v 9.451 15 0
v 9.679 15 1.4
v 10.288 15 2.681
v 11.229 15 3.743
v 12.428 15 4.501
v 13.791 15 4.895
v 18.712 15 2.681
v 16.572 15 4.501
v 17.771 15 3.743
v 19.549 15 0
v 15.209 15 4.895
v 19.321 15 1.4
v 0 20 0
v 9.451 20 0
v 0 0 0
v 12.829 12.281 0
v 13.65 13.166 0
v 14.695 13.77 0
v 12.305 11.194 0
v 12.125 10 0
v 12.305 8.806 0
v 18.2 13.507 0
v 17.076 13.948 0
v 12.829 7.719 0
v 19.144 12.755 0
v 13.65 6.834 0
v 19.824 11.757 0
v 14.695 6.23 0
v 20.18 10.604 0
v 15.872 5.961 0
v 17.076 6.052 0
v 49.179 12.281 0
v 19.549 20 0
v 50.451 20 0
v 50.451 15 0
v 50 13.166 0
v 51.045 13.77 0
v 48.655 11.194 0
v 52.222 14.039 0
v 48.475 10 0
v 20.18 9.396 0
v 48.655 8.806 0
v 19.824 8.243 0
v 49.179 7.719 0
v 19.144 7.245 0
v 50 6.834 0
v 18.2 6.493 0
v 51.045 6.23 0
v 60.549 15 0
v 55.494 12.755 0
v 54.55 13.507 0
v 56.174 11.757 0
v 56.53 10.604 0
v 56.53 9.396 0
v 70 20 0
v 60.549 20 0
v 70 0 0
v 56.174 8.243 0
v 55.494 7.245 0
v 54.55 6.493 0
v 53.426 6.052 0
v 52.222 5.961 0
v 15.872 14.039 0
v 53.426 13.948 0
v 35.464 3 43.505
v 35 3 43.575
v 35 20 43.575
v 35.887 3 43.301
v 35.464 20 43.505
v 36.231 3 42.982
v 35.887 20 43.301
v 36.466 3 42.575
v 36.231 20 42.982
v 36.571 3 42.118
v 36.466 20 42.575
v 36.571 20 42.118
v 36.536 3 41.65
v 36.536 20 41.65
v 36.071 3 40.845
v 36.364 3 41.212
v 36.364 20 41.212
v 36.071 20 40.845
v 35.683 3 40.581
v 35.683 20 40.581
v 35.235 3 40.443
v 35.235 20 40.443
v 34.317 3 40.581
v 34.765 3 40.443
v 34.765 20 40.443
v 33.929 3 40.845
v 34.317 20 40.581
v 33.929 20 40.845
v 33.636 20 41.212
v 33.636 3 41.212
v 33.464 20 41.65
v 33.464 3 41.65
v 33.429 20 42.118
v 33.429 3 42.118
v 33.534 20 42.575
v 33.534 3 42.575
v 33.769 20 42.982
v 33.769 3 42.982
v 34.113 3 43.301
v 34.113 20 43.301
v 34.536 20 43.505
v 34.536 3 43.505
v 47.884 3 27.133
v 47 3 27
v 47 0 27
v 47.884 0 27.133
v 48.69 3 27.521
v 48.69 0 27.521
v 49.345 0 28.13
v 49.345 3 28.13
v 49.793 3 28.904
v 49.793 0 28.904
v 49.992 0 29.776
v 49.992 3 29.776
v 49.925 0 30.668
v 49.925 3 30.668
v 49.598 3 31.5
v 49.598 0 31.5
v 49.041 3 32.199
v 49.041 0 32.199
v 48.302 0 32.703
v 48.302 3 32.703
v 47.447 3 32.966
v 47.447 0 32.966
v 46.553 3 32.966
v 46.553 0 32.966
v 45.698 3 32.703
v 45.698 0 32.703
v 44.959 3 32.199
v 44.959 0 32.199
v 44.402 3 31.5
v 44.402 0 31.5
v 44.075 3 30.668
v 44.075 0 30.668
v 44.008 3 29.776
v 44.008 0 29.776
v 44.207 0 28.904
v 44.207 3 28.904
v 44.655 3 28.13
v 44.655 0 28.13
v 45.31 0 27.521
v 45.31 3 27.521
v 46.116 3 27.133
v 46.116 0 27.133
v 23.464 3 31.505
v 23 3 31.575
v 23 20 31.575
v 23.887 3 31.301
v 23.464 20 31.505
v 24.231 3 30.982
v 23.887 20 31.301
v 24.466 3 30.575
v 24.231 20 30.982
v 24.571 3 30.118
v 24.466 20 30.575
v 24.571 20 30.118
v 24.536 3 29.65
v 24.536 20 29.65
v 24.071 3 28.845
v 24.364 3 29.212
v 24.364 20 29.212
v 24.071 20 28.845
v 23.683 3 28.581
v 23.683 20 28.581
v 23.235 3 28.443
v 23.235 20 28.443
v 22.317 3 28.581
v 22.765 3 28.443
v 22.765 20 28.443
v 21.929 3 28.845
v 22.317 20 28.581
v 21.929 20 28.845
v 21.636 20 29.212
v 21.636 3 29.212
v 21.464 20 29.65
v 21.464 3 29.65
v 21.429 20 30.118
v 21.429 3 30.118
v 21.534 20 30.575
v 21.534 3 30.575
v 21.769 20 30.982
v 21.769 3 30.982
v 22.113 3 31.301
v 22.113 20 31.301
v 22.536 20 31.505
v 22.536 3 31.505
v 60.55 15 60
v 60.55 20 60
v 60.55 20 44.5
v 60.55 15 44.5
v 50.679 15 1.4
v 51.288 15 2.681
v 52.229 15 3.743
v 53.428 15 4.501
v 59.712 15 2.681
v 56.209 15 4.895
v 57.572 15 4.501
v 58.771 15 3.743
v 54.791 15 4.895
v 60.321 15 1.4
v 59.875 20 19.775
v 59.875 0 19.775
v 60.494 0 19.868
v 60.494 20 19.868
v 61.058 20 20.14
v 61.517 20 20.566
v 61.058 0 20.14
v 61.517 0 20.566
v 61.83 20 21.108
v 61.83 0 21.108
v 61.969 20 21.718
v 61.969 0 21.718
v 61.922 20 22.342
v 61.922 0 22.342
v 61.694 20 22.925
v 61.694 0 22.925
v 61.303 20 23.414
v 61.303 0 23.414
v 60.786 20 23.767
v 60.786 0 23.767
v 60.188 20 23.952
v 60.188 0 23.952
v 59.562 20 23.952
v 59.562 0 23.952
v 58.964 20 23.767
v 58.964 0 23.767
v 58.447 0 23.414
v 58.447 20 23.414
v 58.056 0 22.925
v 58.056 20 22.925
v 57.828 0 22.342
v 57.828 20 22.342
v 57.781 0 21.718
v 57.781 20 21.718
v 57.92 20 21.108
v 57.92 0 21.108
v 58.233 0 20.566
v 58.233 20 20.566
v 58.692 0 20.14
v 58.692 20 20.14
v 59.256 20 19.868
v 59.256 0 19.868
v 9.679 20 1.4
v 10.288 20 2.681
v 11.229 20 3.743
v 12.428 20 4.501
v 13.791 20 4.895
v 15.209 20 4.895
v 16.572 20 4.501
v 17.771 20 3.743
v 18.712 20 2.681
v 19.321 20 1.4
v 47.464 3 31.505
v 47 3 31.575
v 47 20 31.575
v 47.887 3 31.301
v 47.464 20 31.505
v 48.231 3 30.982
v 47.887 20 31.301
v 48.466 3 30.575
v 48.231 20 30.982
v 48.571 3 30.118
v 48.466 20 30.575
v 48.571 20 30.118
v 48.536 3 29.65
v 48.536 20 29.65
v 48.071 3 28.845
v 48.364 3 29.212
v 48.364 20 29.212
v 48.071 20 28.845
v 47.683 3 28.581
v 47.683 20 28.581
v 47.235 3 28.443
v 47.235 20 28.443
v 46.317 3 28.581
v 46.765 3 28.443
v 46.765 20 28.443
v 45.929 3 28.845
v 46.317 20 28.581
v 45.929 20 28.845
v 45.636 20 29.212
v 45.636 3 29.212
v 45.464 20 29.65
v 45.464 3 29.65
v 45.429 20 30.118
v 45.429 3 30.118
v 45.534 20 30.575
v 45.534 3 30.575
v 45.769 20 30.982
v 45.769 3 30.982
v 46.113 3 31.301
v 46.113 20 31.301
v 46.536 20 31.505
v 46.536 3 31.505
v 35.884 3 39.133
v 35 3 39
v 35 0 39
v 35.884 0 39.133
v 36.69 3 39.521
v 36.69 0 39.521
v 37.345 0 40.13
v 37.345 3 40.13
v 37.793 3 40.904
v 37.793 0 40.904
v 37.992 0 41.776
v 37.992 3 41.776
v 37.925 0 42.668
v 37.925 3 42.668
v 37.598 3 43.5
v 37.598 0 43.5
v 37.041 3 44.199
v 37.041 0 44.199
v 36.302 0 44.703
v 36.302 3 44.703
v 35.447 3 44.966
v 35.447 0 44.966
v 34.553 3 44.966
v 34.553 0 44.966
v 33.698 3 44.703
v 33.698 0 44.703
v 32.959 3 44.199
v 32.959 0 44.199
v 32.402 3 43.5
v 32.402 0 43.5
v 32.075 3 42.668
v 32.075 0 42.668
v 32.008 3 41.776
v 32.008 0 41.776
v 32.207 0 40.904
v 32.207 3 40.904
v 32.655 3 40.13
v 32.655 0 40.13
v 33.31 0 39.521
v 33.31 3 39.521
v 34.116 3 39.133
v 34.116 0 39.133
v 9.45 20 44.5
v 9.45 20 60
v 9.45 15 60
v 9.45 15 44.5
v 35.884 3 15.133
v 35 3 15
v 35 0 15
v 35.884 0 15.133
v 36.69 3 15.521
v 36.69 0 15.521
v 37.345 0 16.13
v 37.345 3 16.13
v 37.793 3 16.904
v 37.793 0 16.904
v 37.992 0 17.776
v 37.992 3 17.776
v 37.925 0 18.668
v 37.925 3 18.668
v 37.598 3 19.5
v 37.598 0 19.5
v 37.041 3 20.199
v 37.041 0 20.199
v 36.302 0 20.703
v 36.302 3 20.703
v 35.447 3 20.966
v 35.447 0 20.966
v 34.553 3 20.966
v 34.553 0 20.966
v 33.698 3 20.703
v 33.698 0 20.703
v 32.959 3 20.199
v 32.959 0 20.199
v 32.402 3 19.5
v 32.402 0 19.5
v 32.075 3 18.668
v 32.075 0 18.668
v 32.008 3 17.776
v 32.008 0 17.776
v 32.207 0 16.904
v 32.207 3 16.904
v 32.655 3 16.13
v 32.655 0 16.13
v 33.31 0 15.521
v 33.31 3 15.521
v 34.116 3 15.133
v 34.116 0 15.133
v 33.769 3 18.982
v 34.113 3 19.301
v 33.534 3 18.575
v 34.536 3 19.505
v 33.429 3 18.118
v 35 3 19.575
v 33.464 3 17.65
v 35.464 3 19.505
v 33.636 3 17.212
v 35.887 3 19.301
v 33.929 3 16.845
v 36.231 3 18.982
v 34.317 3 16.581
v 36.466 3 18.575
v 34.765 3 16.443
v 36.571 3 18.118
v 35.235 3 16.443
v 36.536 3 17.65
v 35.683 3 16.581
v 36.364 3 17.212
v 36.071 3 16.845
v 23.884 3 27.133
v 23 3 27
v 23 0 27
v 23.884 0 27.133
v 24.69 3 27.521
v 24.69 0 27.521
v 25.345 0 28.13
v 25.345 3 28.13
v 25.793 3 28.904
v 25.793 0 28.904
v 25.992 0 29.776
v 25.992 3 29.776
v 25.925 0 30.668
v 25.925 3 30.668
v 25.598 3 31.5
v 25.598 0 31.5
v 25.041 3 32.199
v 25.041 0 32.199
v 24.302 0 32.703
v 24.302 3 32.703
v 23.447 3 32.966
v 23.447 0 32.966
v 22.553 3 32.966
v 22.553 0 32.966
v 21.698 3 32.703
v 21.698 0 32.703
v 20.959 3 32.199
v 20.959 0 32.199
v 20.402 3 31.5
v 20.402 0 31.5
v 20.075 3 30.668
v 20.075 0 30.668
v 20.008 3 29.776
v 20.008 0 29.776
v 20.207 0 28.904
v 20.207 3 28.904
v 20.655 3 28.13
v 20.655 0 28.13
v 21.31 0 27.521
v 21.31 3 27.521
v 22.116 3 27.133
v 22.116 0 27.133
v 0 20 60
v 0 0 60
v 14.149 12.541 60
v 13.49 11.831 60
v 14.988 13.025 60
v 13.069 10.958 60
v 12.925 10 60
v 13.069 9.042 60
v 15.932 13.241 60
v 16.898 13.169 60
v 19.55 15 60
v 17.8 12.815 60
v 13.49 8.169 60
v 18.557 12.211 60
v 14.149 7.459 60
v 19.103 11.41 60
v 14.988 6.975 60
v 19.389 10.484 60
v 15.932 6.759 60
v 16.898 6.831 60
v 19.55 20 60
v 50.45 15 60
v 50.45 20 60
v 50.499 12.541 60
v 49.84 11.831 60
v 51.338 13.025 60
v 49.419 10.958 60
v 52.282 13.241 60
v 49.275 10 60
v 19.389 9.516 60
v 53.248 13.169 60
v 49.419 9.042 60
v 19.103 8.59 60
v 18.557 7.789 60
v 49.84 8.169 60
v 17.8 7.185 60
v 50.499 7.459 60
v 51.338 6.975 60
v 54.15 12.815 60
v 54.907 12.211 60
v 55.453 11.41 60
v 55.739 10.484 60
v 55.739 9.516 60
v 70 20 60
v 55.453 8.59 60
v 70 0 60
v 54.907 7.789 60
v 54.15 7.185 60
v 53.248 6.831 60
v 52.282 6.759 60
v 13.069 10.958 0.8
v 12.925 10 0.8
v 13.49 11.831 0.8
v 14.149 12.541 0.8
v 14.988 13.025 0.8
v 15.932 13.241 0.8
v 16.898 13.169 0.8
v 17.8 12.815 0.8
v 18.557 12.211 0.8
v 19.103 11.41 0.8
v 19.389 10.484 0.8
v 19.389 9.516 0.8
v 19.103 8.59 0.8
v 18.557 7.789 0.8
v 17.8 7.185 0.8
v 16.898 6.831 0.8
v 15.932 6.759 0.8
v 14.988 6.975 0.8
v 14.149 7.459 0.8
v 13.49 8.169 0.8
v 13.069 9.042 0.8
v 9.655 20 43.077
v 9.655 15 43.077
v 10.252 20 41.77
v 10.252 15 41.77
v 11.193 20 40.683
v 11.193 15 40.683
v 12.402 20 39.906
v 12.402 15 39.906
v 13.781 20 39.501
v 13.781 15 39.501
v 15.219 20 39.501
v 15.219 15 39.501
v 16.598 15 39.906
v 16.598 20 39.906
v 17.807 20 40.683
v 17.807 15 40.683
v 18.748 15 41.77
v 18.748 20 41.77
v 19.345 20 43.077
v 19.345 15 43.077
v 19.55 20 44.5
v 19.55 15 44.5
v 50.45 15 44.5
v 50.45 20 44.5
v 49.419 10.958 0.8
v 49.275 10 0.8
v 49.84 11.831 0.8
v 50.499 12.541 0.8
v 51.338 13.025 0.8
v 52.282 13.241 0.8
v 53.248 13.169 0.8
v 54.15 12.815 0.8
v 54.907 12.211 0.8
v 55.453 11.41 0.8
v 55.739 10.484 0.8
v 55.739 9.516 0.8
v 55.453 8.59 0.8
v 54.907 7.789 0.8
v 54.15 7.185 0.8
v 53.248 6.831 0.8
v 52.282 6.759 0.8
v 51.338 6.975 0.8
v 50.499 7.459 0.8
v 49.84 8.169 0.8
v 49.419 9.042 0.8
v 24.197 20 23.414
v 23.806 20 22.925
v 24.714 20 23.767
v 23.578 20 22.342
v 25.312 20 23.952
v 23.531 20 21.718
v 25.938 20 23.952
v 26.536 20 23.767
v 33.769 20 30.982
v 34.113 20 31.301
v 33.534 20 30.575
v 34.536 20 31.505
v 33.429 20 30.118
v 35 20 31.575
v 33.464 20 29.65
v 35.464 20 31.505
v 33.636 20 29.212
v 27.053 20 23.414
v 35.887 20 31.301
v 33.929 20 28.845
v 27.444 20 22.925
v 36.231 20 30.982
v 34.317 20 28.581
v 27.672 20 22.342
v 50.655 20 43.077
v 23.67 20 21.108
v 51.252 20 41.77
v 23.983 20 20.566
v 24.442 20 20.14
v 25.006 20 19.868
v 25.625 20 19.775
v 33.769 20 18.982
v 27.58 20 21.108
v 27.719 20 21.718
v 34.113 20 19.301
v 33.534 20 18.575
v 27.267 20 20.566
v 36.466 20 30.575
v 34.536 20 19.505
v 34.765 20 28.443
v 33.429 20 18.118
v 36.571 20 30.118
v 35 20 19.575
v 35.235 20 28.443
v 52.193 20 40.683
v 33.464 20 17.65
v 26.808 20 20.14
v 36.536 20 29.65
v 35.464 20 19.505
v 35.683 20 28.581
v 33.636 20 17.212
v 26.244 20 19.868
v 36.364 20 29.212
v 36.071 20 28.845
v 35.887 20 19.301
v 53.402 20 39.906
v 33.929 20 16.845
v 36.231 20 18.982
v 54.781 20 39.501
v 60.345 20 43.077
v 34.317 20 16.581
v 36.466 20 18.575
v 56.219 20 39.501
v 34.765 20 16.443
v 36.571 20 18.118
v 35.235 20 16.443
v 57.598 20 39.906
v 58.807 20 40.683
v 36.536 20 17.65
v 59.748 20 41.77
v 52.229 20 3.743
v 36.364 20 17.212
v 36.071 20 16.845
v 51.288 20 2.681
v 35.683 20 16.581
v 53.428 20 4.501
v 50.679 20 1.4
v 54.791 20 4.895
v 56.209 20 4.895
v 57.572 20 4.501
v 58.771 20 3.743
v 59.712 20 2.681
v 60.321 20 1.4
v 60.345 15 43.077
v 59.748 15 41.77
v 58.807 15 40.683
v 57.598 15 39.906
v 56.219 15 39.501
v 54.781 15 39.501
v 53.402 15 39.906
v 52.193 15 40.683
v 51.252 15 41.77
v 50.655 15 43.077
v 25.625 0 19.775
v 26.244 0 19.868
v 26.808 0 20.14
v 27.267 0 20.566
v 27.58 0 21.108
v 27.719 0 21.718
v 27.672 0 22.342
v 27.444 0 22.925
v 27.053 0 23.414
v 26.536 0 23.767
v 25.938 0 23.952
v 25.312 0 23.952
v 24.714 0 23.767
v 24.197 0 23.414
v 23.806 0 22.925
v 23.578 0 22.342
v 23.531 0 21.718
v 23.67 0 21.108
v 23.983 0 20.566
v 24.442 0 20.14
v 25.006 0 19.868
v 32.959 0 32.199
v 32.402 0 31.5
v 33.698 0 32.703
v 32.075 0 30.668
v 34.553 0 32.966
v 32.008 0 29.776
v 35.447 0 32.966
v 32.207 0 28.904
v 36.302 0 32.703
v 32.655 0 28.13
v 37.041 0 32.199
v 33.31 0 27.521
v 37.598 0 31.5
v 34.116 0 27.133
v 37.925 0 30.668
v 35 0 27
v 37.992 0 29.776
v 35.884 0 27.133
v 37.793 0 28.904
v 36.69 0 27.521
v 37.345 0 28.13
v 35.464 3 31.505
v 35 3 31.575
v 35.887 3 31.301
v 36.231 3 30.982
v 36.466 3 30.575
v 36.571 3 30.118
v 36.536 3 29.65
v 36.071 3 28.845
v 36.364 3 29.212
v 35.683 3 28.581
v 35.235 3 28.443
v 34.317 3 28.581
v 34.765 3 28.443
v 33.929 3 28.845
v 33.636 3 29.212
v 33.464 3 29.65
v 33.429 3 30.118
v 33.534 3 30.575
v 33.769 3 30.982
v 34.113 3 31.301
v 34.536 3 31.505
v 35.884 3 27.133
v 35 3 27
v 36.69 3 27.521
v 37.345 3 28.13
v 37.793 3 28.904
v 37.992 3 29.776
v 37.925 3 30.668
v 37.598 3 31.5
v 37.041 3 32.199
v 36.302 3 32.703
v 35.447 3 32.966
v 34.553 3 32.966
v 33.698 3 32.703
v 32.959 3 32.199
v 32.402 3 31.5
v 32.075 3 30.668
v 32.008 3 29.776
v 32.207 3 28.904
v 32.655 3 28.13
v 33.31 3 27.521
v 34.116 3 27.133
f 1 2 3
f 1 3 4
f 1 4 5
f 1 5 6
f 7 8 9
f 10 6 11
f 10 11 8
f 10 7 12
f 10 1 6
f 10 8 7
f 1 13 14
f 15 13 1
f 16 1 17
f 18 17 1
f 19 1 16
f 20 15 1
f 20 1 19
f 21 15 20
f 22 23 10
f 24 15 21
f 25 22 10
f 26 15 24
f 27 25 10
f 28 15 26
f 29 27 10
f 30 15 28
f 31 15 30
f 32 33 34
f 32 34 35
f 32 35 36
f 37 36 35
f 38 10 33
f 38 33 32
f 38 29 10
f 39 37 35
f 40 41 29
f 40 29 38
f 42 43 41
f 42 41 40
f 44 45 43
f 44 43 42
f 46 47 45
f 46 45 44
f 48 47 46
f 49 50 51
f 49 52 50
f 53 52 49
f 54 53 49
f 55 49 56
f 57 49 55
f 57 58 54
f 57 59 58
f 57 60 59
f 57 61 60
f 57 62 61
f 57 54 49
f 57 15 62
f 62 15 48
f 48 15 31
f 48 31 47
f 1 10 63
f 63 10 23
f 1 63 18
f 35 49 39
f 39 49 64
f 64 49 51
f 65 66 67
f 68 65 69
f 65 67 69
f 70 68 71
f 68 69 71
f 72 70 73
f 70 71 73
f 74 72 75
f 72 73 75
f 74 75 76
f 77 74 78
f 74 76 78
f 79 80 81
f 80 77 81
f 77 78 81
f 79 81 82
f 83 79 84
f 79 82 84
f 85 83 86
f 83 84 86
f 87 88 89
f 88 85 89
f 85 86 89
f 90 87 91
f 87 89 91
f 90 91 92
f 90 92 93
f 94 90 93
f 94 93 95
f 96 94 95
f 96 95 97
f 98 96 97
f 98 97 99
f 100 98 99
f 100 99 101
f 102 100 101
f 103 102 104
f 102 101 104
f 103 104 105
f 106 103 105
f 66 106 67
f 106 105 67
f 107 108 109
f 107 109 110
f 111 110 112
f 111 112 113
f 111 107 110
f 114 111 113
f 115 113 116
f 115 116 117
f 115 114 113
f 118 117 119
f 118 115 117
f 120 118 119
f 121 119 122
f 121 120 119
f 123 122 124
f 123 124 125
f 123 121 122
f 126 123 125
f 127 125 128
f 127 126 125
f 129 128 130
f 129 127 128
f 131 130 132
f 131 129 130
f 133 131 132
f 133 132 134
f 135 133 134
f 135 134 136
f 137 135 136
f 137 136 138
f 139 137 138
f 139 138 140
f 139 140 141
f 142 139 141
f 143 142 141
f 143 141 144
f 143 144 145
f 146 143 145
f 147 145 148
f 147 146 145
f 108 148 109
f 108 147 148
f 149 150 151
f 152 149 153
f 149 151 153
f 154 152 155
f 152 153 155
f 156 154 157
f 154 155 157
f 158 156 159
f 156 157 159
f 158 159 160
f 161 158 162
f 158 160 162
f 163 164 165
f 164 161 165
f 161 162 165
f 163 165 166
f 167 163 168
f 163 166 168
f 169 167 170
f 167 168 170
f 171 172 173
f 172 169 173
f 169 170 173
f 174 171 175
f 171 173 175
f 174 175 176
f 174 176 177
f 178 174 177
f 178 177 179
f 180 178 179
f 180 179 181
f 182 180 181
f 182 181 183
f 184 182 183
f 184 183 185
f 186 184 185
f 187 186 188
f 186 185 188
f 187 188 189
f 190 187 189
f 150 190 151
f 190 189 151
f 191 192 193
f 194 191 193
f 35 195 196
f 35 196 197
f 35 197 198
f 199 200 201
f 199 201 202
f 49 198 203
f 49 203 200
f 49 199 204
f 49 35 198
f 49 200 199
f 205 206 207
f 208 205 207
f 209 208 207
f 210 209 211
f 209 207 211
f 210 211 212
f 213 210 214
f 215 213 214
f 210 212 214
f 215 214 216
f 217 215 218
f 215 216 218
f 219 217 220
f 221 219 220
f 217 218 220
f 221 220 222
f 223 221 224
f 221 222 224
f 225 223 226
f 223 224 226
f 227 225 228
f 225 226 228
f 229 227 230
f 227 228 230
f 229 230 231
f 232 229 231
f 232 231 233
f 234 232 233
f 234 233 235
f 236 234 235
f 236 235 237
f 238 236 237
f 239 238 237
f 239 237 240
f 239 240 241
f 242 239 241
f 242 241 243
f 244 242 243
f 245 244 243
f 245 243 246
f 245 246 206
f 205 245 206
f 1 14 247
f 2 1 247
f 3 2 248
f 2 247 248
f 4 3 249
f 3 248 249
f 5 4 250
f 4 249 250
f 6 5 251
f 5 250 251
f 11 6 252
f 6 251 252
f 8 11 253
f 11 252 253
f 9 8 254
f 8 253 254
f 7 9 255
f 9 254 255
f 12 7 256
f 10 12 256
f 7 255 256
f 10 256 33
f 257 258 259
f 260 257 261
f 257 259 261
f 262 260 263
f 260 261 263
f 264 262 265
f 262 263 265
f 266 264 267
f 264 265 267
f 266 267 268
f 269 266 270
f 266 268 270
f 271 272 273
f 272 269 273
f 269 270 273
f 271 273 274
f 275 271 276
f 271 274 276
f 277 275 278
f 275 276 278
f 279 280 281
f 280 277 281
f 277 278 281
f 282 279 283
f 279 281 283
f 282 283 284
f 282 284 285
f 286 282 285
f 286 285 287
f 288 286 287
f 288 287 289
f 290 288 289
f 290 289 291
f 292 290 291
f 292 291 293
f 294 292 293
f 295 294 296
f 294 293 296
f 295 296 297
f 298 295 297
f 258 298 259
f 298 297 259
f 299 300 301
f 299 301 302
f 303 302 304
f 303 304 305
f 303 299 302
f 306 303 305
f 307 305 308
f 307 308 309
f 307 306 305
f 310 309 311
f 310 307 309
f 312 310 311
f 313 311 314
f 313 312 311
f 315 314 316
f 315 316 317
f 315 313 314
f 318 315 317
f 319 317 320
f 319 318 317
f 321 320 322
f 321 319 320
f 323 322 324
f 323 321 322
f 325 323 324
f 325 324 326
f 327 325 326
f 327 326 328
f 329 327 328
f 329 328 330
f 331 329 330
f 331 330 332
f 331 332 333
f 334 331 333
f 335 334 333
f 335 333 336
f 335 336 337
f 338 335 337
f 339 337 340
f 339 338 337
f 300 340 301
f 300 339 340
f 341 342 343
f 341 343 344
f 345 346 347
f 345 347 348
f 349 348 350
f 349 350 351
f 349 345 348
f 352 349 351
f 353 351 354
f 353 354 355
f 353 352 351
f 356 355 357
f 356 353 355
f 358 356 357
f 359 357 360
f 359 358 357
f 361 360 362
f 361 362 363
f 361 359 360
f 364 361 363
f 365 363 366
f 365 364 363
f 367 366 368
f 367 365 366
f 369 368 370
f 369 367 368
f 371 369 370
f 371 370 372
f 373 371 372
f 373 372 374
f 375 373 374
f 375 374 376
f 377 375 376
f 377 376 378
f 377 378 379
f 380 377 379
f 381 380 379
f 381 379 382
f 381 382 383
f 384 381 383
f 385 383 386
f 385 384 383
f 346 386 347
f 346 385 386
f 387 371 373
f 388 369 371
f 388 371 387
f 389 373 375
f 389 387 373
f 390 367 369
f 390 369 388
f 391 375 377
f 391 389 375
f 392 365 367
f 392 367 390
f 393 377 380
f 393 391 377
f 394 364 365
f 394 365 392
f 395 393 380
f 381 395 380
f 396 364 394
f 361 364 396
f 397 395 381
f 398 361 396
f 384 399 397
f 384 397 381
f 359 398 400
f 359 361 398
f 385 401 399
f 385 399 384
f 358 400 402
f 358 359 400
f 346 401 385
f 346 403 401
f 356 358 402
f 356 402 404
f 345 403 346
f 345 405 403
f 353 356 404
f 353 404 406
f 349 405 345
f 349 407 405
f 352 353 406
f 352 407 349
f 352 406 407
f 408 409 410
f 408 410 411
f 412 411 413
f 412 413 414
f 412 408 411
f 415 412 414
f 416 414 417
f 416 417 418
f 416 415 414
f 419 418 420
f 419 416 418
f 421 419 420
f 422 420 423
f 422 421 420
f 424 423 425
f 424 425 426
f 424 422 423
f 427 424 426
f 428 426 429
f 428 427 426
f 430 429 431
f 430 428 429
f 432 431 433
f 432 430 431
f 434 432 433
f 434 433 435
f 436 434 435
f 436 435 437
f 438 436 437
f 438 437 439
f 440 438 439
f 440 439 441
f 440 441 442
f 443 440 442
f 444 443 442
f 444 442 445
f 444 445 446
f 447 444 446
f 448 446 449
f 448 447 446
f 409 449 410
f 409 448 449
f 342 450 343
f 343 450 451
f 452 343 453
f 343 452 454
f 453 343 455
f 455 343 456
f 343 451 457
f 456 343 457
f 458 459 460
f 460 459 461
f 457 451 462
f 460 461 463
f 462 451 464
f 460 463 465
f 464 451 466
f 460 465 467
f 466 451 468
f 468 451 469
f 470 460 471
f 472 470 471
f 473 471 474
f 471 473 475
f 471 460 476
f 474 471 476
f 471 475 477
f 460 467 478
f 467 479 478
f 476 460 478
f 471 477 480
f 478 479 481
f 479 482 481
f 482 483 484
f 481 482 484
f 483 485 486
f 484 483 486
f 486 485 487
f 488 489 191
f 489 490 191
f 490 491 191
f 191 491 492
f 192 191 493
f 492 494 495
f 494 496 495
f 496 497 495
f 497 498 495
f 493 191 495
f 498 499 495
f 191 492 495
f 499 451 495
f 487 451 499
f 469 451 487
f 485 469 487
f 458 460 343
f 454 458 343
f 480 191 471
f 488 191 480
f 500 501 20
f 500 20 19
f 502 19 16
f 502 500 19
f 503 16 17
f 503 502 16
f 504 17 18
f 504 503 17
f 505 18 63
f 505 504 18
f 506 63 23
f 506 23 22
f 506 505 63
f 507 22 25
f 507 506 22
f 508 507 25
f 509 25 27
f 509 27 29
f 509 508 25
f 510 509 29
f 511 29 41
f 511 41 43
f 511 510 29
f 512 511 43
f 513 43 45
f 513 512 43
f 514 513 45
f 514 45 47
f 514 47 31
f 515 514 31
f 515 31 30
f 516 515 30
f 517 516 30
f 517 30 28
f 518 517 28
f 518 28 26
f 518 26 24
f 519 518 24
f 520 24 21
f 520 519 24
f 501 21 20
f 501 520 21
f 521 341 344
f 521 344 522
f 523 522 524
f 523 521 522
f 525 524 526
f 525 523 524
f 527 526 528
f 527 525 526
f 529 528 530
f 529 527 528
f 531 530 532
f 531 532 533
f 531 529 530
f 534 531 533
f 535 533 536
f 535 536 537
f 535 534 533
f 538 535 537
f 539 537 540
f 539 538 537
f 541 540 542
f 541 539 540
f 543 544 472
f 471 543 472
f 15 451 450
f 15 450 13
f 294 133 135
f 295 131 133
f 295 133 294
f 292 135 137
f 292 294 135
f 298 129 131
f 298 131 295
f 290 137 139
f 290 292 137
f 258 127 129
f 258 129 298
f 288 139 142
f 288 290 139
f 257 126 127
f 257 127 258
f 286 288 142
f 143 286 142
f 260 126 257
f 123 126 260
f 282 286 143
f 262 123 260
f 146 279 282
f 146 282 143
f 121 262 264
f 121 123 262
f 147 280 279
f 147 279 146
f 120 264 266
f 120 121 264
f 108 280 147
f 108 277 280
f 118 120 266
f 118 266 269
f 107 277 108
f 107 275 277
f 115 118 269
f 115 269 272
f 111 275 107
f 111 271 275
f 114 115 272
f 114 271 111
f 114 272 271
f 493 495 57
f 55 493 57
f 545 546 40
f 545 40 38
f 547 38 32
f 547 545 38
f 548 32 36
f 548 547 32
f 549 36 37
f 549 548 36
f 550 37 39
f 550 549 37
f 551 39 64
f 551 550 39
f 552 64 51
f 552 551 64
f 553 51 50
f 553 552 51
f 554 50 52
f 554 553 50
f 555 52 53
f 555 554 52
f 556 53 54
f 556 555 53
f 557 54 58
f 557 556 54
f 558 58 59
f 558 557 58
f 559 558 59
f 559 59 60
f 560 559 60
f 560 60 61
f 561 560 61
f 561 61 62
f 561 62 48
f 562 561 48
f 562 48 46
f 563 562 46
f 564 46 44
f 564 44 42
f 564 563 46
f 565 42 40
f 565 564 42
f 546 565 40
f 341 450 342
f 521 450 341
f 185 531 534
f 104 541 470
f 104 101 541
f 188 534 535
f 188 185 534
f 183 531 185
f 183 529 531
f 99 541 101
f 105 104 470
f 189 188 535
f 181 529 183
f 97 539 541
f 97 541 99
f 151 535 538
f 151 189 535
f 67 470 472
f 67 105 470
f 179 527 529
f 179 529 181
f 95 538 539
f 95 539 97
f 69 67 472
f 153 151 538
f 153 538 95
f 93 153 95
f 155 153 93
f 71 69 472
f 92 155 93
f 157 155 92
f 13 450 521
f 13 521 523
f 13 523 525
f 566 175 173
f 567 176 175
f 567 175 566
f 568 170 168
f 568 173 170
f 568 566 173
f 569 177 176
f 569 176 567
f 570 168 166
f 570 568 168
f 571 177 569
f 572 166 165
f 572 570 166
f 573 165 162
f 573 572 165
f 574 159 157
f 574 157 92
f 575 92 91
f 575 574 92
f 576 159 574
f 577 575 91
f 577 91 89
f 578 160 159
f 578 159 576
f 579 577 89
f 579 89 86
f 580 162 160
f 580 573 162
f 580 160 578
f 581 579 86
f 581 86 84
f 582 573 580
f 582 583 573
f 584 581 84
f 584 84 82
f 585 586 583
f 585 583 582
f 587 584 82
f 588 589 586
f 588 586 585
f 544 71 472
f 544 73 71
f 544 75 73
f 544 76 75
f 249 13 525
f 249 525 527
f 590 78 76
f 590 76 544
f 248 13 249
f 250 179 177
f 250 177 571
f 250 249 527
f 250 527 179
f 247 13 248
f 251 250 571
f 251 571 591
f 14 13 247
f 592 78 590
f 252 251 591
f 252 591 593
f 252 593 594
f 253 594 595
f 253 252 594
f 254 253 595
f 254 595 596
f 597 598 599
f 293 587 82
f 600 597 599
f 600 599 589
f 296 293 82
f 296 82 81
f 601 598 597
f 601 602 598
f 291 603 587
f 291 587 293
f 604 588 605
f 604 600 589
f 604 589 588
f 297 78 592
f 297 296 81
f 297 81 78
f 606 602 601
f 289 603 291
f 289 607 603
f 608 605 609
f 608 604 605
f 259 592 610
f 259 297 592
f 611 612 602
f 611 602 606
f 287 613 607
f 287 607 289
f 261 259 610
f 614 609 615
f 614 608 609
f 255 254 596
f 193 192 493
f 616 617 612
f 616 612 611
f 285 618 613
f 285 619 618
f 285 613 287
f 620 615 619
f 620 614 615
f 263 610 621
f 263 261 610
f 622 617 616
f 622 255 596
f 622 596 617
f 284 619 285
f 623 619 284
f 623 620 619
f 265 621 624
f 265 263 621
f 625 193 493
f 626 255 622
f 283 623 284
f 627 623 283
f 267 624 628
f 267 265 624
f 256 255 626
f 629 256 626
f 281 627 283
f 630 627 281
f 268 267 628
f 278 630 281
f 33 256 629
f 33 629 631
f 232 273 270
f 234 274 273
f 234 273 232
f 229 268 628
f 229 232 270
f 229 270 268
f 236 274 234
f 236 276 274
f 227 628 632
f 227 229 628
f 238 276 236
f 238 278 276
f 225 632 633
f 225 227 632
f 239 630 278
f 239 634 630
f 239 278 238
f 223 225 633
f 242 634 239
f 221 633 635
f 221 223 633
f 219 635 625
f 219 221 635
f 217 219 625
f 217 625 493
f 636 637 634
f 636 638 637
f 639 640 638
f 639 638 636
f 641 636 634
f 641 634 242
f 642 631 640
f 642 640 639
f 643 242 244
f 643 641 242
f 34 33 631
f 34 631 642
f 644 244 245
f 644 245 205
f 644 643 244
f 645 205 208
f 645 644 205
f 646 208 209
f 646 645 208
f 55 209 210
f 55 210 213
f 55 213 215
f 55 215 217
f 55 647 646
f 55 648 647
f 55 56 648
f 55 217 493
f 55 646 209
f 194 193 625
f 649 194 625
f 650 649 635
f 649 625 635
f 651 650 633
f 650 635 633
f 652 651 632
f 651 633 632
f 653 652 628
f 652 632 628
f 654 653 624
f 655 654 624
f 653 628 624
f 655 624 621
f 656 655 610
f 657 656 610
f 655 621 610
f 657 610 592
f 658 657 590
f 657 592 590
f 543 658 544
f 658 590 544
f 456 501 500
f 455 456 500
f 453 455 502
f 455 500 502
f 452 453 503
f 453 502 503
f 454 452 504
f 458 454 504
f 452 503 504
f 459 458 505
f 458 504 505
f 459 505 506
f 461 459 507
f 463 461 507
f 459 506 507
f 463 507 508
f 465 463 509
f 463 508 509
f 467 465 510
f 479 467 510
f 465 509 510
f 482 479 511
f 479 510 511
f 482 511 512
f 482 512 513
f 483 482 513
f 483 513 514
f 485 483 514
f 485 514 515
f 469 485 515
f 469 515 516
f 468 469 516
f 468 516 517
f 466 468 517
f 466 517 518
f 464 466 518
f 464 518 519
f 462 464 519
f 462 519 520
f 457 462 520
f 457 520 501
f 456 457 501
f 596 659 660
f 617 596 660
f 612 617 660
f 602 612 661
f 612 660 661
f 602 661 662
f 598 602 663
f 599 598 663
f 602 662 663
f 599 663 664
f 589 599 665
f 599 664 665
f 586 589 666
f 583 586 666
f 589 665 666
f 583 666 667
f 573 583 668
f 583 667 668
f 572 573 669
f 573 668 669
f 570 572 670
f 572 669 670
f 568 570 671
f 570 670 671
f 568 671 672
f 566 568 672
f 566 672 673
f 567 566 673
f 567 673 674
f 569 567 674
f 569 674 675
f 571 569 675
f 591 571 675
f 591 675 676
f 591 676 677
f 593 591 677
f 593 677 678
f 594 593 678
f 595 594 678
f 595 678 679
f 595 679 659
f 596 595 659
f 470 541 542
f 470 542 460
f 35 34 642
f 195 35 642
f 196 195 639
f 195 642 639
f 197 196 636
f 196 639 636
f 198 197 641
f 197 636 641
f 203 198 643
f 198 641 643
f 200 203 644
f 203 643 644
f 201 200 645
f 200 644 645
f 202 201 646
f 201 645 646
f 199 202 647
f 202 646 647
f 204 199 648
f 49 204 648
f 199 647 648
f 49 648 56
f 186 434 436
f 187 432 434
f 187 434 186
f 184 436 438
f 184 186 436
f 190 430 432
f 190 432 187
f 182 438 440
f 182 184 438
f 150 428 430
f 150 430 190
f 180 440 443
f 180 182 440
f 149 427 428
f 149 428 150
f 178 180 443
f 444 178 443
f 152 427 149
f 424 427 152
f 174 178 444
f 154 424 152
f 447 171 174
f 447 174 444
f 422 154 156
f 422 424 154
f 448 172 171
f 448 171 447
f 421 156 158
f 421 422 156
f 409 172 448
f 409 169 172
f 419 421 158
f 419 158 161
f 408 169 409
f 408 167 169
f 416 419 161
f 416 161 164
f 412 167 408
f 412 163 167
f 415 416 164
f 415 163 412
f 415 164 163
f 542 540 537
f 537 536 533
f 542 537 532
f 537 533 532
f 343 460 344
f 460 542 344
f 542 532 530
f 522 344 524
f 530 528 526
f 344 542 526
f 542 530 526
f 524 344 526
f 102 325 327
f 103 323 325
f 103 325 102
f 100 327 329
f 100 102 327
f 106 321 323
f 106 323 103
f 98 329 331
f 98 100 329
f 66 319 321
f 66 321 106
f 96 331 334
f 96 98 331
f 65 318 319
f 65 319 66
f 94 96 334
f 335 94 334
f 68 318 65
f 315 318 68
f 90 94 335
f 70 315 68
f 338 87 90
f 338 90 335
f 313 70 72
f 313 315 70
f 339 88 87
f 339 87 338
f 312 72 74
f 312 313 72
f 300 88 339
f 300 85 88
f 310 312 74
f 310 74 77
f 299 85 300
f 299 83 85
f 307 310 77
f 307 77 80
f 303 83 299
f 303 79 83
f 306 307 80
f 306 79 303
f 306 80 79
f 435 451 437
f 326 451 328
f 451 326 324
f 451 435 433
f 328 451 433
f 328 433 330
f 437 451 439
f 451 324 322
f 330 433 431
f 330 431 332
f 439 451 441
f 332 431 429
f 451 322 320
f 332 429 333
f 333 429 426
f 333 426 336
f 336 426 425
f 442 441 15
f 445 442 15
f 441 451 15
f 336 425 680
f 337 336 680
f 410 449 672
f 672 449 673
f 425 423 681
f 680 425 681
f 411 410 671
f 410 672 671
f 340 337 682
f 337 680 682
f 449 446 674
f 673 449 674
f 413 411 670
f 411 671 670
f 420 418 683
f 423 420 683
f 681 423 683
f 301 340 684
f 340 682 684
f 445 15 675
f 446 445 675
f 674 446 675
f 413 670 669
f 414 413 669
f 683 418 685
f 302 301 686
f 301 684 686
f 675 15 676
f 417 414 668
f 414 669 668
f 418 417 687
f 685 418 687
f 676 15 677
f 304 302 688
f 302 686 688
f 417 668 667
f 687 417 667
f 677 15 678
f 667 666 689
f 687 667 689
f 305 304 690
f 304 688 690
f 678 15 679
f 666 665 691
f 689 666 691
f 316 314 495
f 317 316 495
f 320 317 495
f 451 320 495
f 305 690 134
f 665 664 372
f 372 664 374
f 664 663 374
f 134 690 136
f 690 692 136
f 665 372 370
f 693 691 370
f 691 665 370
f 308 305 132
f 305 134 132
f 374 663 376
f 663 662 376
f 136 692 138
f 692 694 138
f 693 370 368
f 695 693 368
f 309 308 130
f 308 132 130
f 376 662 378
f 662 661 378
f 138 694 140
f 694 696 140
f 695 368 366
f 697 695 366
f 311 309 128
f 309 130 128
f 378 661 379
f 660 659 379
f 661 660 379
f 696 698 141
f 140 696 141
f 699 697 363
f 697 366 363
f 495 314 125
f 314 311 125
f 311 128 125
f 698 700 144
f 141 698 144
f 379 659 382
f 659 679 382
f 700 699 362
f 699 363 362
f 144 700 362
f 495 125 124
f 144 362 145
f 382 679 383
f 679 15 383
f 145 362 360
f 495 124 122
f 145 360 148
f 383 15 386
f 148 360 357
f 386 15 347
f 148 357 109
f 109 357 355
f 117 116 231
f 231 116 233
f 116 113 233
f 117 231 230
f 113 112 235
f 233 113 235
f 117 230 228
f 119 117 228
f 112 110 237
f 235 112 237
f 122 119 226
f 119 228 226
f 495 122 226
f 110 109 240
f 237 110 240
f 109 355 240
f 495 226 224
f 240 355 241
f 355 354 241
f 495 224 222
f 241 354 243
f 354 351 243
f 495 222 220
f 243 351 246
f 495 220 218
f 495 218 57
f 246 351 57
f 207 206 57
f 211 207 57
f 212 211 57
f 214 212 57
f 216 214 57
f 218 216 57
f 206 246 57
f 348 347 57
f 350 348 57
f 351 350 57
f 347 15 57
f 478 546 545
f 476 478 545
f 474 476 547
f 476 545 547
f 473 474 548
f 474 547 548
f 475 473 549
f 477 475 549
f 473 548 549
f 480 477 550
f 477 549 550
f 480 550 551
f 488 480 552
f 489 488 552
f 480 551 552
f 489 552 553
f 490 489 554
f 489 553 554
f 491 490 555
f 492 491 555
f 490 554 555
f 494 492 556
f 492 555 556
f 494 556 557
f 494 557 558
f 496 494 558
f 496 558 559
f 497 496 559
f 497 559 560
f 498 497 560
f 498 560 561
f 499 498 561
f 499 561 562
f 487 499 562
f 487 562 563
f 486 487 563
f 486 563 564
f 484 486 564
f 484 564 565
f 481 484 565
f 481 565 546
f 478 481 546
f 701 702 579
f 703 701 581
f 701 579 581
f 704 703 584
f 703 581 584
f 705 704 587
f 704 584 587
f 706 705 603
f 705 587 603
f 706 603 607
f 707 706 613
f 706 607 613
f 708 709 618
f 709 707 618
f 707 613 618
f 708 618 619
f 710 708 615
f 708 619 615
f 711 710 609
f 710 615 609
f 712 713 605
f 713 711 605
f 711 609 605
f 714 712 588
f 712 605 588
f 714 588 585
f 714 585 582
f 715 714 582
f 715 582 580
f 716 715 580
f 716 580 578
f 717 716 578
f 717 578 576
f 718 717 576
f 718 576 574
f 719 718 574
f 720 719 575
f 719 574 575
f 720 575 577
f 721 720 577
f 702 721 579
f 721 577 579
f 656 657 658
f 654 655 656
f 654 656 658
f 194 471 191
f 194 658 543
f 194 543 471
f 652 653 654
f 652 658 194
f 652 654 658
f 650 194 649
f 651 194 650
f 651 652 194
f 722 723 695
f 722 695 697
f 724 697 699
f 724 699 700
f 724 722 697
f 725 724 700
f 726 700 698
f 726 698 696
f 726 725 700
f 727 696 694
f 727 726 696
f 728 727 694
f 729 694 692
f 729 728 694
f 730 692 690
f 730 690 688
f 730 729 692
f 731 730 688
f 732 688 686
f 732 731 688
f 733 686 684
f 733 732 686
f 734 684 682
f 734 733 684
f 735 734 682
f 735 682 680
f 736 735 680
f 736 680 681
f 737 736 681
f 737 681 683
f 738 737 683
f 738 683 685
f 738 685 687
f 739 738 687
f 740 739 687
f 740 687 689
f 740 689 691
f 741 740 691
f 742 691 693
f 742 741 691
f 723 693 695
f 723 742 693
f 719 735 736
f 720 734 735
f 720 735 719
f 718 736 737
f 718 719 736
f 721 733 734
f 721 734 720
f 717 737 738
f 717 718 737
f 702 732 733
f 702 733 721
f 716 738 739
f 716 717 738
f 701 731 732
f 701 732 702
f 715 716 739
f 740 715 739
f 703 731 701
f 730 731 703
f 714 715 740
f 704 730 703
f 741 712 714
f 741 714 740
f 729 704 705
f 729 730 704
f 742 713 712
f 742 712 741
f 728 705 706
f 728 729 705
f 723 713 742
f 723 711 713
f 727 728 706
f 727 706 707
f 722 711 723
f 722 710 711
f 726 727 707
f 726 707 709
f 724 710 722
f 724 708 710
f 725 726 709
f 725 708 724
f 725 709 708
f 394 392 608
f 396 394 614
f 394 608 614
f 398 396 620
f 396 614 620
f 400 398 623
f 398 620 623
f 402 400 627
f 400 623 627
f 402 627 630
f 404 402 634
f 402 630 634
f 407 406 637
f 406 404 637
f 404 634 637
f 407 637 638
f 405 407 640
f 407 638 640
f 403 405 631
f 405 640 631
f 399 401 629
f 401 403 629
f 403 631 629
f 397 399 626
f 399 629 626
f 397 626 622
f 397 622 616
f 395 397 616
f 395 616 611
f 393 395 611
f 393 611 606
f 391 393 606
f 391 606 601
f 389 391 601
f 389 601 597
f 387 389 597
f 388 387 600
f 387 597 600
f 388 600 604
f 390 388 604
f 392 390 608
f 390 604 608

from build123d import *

# Parameters (mm, degrees)
SKETCH3_W           = 70
SKETCH3_H           = 60
BOSS_EXTRUDE3_DEPTH = 20
SKETCH4_R           = 1.575
CUT_EXTRUDE1_DEPTH  = 95.339811321
SKETCH6_R           = 2.1
CUT_EXTRUDE2_DEPTH  = 95.339811321
SKETCH9_R           = 3.25
CUT_EXTRUDE3_DEPTH  = 95.339811321
CUT_EXTRUDE4_START  = -3
SKETCH11_R          = 3
SKETCH11_R_2        = 1.575
CUT_EXTRUDE4_DEPTH  = 3
CHAMFER1_SIZE       = 0.8
SKETCH12_R          = 5.05
CUT_EXTRUDE5_DEPTH  = 5


with BuildPart() as part:
    # Sketch3 → Boss-Extrude3 (new body)
    with BuildSketch(Plane(origin=(0, 0, 0), x_dir=(1, 0, 0), z_dir=(0, 1, 0))):
        with Locations((35, -30)):
            Rectangle(SKETCH3_W, SKETCH3_H)
    extrude(amount=BOSS_EXTRUDE3_DEPTH)

    # Sketch4 → Cut-Extrude1 (cut, through all)
    with BuildSketch(Plane(origin=(0, 20, 0), x_dir=(1, 0, 0), z_dir=(0, 1, 0))):
        with Locations(Location((35, -30, 0), (0, 0, 270))):
            Circle(SKETCH4_R)
        with Locations(Location((35, -18, 0), (0, 0, 270))):
            Circle(SKETCH4_R)
        with Locations(Location((47, -30, 0), (0, 0, 270))):
            Circle(SKETCH4_R)
        with Locations(Location((35, -42, 0), (0, 0, 270))):
            Circle(SKETCH4_R)
        with Locations(Location((23, -30, 0), (0, 0, 270))):
            Circle(SKETCH4_R)
    extrude(amount=-CUT_EXTRUDE1_DEPTH, mode=Mode.SUBTRACT)

    # Sketch6 → Cut-Extrude2 (cut, through all)
    with BuildSketch(Plane.XZ):
        with Locations(Location((59.875, 21.875, 0), (0, 0, 270))):
            Circle(SKETCH6_R)
        with Locations(Location((25.625, 21.875, 0), (0, 0, 270))):
            Circle(SKETCH6_R)
    extrude(amount=-CUT_EXTRUDE2_DEPTH, mode=Mode.SUBTRACT)

    # Sketch9 → Cut-Extrude3 (cut, through all)
    with BuildSketch(Plane(origin=(0, 0, 0), x_dir=(-1, 0, 0), z_dir=(0, 0, -1))):
        with Locations((-52.525, 10)):
            Circle(SKETCH9_R)
        with Locations((-16.175, 10)):
            Circle(SKETCH9_R)
    extrude(amount=-CUT_EXTRUDE3_DEPTH, mode=Mode.SUBTRACT)

    # Sketch11 → Cut-Extrude4 (cut)
    # profile 1 of 10: a face of its own
    with BuildSketch(Plane.XZ.offset(CUT_EXTRUDE4_START)):
        with Locations(Location((35, 18, 0), (0, 0, 270))):
            Circle(SKETCH11_R)
        with Locations(Location((35, 18, 0), (0, 0, 90))):
            Circle(SKETCH11_R_2, mode=Mode.SUBTRACT)
    # profile 2 of 10: a face of its own
    with BuildSketch(Plane.XZ.offset(CUT_EXTRUDE4_START)):
        with Locations(Location((35, 30, 0), (0, 0, 270))):
            Circle(SKETCH11_R)
        with Locations(Location((35, 30, 0), (0, 0, 90))):
            Circle(SKETCH11_R_2, mode=Mode.SUBTRACT)
    # profile 3 of 10: a face of its own
    with BuildSketch(Plane.XZ.offset(CUT_EXTRUDE4_START)):
        with Locations(Location((47, 30, 0), (0, 0, 270))):
            Circle(SKETCH11_R)
        with Locations(Location((47, 30, 0), (0, 0, 90))):
            Circle(SKETCH11_R_2, mode=Mode.SUBTRACT)
    # profile 4 of 10: a face of its own
    with BuildSketch(Plane.XZ.offset(CUT_EXTRUDE4_START)):
        with Locations(Location((23, 30, 0), (0, 0, 270))):
            Circle(SKETCH11_R)
        with Locations(Location((23, 30, 0), (0, 0, 90))):
            Circle(SKETCH11_R_2, mode=Mode.SUBTRACT)
    # profile 5 of 10: a face of its own
    with BuildSketch(Plane.XZ.offset(CUT_EXTRUDE4_START)):
        with Locations(Location((35, 42, 0), (0, 0, 270))):
            Circle(SKETCH11_R)
        with Locations(Location((35, 42, 0), (0, 0, 90))):
            Circle(SKETCH11_R_2, mode=Mode.SUBTRACT)
    # profile 6 of 10: a face of its own
    with BuildSketch(Plane.XZ.offset(CUT_EXTRUDE4_START)):
        with Locations(Location((35, 42, 0), (0, 0, 90))):
            Circle(SKETCH11_R_2)
    # profile 7 of 10: a face of its own
    with BuildSketch(Plane.XZ.offset(CUT_EXTRUDE4_START)):
        with Locations(Location((23, 30, 0), (0, 0, 90))):
            Circle(SKETCH11_R_2)
    # profile 8 of 10: a face of its own
    with BuildSketch(Plane.XZ.offset(CUT_EXTRUDE4_START)):
        with Locations(Location((35, 30, 0), (0, 0, 90))):
            Circle(SKETCH11_R_2)
    # profile 9 of 10: a face of its own
    with BuildSketch(Plane.XZ.offset(CUT_EXTRUDE4_START)):
        with Locations(Location((47, 30, 0), (0, 0, 90))):
            Circle(SKETCH11_R_2)
    # profile 10 of 10: a face of its own
    with BuildSketch(Plane.XZ.offset(CUT_EXTRUDE4_START)):
        with Locations(Location((35, 18, 0), (0, 0, 90))):
            Circle(SKETCH11_R_2)
    extrude(amount=CUT_EXTRUDE4_DEPTH, mode=Mode.SUBTRACT)

    # Chamfer1
    chamfer1_edges = [part.edges().sort_by_distance(p)[0] for p in [
        (55.775, 10, 0),
        (19.425, 10, 0),
    ]]
    chamfer(chamfer1_edges, length=CHAMFER1_SIZE)

    # Sketch12 → Cut-Extrude5 (cut)
    with BuildSketch(Plane(origin=(0, 20, 0), x_dir=(1, 0, 0), z_dir=(0, 1, 0))):
        with Locations((14.5, 0.104949747)):
            Circle(SKETCH12_R)
        with Locations((55.5, 0.104949747)):
            Circle(SKETCH12_R)
        with BuildLine():
            Line((9.45, -60.104949747), (9.45, -44.5))
            ThreePointArc((9.45, -44.5), (14.5, -39.45), (19.55, -44.5))
            Line((19.55, -44.5), (19.55, -60.104949747))
            ThreePointArc((19.55, -60.104949747), (14.5, -65.154949747), (9.45, -60.104949747))
        make_face()
        with BuildLine():
            Line((60.55, -60.104949747), (60.55, -44.5))
            ThreePointArc((60.55, -44.5), (55.5, -39.45), (50.45, -44.5))
            Line((50.45, -44.5), (50.45, -60.104949747))
            ThreePointArc((50.45, -60.104949747), (55.5, -65.154949747), (60.55, -60.104949747))
        make_face()
    extrude(amount=-CUT_EXTRUDE5_DEPTH, mode=Mode.SUBTRACT)


solid = part.part
